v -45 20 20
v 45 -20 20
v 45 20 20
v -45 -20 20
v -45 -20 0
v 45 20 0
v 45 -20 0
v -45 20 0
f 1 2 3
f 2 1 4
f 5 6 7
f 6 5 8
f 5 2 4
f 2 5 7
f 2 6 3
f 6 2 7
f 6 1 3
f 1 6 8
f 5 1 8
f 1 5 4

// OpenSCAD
wO=40;
wthick=1;
wI=wO-wthick*2;

lO=90;
lI=lO-wthick*2;

h=20;


translate([0,0,h/2])cube([lO,wO,h],center=true);
